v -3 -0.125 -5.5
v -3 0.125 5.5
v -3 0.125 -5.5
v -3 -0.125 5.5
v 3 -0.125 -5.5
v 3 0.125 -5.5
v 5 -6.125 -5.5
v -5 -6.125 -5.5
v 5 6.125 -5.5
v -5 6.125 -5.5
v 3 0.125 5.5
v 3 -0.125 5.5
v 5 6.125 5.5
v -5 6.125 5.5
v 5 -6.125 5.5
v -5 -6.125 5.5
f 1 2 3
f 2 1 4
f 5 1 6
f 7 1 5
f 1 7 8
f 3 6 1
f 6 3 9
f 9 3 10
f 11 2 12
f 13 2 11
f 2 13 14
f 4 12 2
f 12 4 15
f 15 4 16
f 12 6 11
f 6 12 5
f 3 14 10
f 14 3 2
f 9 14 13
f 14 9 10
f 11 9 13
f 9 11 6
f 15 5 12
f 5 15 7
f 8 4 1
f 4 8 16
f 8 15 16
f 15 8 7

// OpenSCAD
// file: joint.scad
include <common.scad>
include <config.scad>

module joint_dovetail()
{
	rotate([90, 0, 0])
		translate([0, -(wall_dovetail_len / 2), (joint_depth / 2)])
			dovetail(
				length = wall_dovetail_len,
				depth = joint_depth,
				neck = joint_neck,
				head = joint_head
			);
}

module joint(joint_len)
{
	c_l = joint_neck;
	c_w = joint_len + eps;
	c_h = wall_dovetail_len;

	joint_x = 0;
	joint_y = (joint_len / 2) + (joint_depth / 2);
	joint_z = 0;

	union()
	{
		color(color_joint)
			cube([c_l, c_w, c_h], center=true);

		color(color_dovetail)
			translate([joint_x, joint_y, joint_z])
				rotate([0, 0, 0])
					joint_dovetail();

		color(color_dovetail)
			translate([-joint_x, -joint_y, joint_z])
				rotate([0, 0, 180])
					joint_dovetail();
	}
}

module joint_base()
{
	joint(shelf_w - (wall_t * 2));
}

module joint_modules()
{
	joint(clearance);
}
// file: config.scad
clearance = 0.25;
eps = 0.02;

color_dovetail = "red";
color_joint = "purple";
color_print = "white";
color_shelf = "green";
color_test = "black";
color_wall = "orange";

shelf_d = 67;
shelf_h_sep = 80;
shelf_t = 6;
shelf_w = 240;

wall_cut = 25;
wall_t = 16;

joint_depth = 6;
joint_neck = 6;
joint_head = 10;
back_stop = 5;

shelf_dovetail_len = shelf_d - back_stop;
wall_dovetail_len = wall_t - back_stop;
// file: common.scad
include <config.scad>

module dovetail(length,
	depth,
	neck,
	head)
{
	rotate([-90, 0, 0])
		linear_extrude(height = length, convexity = 10)
			polygon(points = [
				[-neck / 2, 0],
				[-head / 2, depth],
				[ head / 2, depth],
				[ neck / 2, 0]
			]);
}
// main file
include <common.scad>
include <config.scad>
include <joint.scad>

rotate([0, 180, 0])
	color(color_print)
		joint_modules();
